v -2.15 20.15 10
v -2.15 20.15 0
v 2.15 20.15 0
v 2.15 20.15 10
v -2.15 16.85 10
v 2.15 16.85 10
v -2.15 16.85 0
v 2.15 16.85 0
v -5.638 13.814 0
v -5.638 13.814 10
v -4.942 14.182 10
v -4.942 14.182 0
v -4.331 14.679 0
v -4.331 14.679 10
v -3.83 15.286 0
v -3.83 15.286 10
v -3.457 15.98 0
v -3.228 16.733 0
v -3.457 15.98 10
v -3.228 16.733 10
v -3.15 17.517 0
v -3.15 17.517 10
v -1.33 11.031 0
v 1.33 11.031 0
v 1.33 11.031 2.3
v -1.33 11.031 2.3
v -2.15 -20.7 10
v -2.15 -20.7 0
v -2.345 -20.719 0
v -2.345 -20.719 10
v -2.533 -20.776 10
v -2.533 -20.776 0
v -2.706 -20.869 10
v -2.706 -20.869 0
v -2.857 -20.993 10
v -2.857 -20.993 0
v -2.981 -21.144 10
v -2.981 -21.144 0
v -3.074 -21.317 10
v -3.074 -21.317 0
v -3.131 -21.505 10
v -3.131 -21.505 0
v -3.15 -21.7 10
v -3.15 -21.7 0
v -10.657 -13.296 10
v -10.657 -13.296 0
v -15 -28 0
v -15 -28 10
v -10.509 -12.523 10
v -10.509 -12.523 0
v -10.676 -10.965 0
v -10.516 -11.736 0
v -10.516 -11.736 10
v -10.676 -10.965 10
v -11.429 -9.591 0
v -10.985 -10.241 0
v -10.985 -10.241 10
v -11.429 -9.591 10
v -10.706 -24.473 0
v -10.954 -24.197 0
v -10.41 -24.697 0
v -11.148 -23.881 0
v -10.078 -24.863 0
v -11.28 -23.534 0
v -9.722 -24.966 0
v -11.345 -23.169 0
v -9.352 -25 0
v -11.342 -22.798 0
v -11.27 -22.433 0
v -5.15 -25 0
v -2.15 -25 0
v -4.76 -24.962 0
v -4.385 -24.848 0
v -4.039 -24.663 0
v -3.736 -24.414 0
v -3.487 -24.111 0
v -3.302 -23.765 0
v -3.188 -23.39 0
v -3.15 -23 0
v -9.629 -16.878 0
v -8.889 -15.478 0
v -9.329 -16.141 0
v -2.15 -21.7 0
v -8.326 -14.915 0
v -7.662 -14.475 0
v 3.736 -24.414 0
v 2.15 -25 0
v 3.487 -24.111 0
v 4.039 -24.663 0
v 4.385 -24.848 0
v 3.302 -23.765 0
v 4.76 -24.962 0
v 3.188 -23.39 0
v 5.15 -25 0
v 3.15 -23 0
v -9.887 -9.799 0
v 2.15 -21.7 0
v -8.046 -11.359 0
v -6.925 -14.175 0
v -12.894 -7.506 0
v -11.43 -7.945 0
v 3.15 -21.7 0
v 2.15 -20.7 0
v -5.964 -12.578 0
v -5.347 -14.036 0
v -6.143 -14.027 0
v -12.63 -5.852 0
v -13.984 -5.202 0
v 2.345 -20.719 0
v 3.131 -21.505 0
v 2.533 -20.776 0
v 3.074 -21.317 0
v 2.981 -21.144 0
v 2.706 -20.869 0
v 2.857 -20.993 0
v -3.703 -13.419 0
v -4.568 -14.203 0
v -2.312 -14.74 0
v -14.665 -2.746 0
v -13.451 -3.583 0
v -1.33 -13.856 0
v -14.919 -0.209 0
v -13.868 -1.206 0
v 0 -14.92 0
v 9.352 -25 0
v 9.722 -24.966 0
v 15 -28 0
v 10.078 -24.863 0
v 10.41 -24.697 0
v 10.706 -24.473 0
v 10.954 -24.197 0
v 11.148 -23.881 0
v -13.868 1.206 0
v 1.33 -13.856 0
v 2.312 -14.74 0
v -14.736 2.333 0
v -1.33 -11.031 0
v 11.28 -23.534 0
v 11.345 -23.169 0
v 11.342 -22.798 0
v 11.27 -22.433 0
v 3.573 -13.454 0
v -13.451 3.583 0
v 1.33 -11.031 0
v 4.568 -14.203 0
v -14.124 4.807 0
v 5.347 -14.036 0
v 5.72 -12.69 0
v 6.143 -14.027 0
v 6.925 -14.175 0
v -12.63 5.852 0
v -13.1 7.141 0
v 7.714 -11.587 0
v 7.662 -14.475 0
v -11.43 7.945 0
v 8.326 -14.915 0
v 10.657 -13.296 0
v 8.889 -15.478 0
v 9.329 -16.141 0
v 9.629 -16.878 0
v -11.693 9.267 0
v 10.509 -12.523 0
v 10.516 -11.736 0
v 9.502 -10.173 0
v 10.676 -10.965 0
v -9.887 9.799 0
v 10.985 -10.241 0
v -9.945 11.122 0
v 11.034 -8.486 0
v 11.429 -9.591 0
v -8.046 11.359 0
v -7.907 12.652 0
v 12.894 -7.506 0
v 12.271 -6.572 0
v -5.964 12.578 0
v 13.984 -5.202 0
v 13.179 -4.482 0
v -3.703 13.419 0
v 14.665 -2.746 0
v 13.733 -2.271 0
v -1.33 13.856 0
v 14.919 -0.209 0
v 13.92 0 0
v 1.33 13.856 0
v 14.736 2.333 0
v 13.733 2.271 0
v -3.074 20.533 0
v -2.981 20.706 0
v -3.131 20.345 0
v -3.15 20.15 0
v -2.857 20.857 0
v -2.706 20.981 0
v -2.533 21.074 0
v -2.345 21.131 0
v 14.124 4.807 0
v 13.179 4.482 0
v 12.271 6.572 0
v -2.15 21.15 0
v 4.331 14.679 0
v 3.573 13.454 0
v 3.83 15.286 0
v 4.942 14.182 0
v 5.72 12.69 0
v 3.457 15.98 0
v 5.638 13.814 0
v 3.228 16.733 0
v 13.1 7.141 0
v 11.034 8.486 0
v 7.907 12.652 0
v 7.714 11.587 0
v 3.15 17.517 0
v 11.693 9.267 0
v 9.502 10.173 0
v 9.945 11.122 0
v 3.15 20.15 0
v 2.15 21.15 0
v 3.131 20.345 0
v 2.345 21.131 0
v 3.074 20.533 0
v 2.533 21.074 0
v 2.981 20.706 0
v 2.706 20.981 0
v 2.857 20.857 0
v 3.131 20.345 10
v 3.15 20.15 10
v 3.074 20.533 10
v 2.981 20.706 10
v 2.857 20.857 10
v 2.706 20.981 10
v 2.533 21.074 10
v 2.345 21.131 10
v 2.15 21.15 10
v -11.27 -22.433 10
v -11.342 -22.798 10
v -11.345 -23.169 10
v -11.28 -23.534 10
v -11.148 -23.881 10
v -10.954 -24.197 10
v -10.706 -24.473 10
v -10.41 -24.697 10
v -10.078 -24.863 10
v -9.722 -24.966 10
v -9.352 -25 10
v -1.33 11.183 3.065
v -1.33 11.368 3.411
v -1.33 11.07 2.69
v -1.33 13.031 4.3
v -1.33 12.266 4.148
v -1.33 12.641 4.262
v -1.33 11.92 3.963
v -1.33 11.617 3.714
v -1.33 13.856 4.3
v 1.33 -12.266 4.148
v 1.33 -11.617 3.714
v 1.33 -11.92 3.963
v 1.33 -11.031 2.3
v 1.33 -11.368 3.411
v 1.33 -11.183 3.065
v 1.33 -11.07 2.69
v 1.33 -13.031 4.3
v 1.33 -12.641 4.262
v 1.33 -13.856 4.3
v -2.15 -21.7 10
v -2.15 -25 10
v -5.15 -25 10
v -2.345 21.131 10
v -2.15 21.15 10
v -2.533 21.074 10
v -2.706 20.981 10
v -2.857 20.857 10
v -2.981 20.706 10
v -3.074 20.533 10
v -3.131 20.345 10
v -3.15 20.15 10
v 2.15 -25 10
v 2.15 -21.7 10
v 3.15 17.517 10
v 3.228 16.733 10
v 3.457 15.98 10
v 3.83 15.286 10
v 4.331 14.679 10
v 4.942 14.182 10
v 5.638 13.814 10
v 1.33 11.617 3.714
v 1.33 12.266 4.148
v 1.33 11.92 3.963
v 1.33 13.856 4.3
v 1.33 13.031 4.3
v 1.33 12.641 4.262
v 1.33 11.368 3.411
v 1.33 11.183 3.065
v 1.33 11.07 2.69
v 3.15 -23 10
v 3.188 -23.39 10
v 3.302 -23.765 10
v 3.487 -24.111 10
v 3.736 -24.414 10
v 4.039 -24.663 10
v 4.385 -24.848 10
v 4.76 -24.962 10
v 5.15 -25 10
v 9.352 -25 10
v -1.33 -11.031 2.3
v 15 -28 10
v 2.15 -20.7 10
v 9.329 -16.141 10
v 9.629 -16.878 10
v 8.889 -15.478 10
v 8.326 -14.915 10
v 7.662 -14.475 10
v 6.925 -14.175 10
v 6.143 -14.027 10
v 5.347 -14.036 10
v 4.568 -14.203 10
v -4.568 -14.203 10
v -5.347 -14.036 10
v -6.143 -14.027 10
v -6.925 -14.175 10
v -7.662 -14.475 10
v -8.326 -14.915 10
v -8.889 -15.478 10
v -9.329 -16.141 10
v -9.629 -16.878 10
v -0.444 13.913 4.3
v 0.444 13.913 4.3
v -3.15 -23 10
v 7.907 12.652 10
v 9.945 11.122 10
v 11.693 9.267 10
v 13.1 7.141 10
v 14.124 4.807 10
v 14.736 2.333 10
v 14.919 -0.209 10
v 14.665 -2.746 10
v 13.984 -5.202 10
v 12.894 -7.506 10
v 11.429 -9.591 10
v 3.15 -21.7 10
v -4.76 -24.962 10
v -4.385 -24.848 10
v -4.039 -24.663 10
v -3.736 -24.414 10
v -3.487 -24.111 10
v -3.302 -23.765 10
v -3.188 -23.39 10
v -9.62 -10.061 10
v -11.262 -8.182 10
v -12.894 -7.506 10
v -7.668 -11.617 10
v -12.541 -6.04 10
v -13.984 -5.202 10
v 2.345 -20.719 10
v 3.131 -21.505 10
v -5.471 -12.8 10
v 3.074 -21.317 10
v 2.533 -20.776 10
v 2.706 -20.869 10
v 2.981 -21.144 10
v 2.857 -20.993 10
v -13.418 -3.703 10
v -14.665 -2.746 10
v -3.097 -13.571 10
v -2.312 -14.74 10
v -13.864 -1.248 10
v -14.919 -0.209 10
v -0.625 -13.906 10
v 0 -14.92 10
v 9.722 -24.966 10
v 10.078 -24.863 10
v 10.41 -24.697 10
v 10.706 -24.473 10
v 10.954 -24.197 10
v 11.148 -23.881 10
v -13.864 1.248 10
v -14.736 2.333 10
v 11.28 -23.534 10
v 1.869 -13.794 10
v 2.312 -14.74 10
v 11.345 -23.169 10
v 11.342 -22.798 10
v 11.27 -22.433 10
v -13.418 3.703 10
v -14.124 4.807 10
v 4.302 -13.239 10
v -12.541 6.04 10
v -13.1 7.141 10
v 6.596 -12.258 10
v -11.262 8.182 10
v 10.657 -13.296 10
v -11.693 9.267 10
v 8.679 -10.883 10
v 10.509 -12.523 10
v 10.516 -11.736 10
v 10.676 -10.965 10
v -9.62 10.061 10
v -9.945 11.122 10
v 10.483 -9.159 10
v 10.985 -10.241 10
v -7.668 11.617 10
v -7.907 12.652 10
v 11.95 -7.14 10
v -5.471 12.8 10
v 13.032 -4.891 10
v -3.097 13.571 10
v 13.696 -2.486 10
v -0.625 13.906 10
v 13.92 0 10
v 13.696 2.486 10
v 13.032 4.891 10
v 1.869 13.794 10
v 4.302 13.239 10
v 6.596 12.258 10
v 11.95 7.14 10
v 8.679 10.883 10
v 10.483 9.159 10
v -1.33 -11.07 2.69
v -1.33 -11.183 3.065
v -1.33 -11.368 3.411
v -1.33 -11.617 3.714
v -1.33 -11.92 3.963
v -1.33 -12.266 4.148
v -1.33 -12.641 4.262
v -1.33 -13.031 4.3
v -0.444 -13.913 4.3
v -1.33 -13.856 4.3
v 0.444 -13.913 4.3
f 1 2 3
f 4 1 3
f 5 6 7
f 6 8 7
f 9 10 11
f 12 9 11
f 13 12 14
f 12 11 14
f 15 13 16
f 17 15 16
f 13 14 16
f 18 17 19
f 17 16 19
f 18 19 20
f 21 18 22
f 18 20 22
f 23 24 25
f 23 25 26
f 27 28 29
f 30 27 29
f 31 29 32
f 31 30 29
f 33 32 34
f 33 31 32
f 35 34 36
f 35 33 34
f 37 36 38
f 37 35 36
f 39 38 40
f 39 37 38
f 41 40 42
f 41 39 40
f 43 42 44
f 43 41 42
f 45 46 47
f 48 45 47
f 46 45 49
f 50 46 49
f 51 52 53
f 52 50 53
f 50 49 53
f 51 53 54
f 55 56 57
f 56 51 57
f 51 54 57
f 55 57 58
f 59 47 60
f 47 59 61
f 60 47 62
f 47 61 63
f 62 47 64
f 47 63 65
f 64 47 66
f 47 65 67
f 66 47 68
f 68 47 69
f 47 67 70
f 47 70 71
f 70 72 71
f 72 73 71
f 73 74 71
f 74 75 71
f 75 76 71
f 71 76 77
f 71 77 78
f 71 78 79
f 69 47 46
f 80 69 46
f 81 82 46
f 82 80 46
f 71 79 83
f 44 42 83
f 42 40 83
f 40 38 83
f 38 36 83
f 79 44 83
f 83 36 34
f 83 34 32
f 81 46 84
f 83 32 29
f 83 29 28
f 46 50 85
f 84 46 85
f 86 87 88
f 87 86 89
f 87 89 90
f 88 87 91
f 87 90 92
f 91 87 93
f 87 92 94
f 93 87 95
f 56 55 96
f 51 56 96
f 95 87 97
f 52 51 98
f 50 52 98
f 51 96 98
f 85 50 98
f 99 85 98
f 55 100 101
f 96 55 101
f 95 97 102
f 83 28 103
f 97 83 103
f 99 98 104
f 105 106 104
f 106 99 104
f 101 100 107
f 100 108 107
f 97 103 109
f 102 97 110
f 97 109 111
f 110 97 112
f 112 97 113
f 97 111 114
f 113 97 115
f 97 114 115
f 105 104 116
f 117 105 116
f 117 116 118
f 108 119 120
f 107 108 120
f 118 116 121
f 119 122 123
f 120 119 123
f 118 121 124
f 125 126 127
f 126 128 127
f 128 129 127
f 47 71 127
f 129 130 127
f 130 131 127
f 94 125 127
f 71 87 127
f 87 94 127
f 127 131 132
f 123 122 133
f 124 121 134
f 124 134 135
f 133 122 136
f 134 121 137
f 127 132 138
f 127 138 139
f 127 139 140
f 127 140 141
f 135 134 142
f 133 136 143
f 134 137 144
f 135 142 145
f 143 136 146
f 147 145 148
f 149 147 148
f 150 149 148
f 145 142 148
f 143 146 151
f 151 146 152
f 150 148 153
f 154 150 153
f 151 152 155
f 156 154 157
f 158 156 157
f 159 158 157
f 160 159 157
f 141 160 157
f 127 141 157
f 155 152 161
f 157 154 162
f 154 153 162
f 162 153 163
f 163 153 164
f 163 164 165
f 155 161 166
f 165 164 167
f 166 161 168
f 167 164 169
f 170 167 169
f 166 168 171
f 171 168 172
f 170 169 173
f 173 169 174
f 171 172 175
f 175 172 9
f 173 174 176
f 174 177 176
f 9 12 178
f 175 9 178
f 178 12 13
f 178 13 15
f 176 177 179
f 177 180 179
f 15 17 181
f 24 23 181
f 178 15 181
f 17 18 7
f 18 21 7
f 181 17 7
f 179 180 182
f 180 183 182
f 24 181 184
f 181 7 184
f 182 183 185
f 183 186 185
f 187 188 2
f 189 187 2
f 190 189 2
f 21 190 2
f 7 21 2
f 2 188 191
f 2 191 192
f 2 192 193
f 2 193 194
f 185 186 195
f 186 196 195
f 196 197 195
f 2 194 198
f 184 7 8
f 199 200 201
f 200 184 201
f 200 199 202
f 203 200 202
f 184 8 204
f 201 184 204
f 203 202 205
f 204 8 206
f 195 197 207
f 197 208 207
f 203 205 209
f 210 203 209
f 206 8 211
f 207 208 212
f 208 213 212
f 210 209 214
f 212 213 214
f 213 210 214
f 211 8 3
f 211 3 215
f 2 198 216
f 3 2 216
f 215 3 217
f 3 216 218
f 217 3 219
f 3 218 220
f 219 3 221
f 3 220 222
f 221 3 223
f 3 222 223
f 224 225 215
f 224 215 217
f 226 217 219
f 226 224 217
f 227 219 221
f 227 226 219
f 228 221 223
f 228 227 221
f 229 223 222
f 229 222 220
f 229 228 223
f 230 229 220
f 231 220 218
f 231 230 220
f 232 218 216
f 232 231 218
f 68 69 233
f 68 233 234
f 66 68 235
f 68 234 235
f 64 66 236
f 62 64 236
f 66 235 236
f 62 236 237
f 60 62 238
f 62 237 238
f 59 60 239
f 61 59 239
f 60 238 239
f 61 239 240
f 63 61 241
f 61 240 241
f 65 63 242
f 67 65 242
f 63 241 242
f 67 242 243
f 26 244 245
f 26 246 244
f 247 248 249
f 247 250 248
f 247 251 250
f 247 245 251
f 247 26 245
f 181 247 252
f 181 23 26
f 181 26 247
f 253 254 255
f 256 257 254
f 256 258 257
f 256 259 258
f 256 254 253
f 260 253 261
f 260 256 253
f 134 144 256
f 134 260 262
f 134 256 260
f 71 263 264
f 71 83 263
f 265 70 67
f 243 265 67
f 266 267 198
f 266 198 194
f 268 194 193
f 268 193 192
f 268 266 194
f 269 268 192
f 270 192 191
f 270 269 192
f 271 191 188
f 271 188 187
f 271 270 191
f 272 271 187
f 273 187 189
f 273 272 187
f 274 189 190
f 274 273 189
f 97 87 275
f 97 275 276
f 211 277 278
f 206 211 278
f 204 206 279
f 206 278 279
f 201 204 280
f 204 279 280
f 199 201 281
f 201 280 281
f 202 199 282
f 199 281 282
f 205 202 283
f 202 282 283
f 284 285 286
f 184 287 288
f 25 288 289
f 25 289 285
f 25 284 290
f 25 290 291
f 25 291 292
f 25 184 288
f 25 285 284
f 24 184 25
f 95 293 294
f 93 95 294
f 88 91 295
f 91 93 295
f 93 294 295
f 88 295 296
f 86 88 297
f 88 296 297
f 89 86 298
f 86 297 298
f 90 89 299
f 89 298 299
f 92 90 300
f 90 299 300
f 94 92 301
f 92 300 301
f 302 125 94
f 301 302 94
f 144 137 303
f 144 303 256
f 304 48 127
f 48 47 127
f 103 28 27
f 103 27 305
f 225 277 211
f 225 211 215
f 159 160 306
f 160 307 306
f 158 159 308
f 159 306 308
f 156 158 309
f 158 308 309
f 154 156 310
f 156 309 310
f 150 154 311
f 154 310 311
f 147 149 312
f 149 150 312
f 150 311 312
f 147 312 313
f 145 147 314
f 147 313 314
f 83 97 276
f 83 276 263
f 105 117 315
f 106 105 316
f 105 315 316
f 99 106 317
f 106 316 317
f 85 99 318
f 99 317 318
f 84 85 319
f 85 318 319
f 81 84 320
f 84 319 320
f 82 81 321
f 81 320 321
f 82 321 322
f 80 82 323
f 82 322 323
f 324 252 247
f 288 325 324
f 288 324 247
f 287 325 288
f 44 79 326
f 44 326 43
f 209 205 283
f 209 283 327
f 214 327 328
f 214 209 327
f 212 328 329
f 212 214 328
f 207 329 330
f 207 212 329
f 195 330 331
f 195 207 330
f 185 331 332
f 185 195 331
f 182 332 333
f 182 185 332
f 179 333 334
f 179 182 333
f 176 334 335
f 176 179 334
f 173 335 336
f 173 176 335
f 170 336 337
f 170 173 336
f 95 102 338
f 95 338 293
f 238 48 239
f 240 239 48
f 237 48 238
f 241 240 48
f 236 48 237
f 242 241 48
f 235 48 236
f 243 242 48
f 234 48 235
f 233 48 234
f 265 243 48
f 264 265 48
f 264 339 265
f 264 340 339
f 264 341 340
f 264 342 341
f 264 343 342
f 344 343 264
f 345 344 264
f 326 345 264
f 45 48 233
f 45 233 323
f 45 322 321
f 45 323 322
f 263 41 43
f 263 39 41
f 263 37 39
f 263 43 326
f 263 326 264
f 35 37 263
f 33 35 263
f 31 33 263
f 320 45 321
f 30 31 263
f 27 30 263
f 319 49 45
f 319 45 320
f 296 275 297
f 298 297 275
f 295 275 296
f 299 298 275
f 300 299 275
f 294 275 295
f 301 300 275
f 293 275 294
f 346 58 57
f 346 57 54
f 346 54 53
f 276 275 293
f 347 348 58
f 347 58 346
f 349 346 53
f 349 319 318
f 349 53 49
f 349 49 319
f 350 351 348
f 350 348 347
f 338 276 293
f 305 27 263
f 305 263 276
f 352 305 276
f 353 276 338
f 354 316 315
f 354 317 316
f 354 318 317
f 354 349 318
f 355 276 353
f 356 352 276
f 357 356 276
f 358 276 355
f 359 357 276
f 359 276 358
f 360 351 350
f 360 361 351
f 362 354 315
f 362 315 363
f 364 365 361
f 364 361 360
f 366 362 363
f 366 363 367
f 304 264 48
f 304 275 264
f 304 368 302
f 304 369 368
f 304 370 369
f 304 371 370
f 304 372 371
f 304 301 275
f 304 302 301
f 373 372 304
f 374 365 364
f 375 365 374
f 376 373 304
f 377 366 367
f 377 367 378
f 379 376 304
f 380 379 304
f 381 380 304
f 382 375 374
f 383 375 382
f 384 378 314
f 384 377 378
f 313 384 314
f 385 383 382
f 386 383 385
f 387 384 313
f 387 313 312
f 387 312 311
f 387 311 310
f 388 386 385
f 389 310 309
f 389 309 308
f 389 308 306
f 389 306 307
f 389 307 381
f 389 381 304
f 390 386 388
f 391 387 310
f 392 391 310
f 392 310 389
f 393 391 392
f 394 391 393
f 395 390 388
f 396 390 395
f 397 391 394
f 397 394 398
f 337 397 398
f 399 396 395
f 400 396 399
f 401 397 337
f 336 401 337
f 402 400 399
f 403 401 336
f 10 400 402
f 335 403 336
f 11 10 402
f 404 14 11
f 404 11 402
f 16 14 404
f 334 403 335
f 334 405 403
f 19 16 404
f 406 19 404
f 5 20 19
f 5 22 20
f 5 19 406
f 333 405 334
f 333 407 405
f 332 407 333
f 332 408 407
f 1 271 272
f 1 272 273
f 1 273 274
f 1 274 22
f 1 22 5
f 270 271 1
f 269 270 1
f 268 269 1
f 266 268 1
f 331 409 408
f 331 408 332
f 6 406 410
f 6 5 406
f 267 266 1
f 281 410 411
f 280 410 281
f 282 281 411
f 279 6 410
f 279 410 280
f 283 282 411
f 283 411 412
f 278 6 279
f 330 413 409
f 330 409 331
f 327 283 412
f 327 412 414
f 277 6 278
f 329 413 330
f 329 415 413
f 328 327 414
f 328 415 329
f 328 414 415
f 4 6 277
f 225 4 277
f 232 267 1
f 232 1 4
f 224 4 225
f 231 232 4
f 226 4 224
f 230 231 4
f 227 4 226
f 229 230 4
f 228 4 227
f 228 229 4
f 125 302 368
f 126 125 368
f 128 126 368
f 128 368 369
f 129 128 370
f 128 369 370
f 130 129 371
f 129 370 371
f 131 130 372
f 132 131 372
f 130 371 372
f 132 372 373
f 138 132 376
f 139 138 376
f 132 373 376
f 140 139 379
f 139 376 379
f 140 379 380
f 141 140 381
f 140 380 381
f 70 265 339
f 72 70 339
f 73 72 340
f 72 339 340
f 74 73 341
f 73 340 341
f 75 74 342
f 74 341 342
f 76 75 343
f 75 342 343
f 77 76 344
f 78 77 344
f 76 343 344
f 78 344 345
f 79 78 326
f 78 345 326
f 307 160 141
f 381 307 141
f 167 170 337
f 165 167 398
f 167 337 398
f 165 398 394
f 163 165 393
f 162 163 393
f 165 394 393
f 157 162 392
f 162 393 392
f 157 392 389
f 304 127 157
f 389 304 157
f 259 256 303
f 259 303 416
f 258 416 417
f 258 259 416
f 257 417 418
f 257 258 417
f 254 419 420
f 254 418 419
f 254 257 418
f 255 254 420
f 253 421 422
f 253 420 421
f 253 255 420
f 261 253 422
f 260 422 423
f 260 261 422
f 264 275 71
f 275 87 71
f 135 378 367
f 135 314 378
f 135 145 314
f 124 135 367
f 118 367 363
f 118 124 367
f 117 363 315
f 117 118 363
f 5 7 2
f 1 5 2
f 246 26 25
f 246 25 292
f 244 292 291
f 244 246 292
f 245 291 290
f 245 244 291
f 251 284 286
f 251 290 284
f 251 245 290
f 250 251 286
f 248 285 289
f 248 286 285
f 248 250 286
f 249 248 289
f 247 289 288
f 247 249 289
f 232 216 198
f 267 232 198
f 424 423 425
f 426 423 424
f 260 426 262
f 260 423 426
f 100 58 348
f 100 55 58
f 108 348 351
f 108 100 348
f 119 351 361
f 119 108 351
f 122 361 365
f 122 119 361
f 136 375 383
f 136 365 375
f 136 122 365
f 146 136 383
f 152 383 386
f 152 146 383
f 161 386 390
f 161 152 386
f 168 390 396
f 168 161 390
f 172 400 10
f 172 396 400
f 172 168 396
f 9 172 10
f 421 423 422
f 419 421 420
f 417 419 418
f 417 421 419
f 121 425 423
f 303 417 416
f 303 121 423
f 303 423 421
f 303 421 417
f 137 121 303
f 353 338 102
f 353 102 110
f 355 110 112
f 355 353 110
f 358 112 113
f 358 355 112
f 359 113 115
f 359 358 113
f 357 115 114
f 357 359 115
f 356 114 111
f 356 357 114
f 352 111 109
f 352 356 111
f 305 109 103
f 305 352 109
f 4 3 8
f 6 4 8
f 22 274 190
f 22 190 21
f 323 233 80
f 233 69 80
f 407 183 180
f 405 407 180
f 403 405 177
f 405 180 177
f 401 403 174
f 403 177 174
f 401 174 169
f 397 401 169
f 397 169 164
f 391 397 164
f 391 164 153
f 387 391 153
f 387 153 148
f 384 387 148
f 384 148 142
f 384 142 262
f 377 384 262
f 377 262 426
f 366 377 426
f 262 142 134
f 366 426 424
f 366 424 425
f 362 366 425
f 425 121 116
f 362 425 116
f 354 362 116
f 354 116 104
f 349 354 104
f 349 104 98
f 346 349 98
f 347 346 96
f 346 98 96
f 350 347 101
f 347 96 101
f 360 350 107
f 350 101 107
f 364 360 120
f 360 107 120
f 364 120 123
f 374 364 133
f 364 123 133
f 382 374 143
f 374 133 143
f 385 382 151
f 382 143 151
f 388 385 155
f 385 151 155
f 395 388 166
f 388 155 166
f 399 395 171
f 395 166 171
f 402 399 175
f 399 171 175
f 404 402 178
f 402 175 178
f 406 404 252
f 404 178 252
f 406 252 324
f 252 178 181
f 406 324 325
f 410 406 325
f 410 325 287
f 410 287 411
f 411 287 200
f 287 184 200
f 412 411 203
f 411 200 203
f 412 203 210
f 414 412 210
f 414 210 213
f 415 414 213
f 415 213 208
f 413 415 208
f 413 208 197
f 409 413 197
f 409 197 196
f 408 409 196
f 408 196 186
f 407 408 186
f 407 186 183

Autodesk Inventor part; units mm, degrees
ref_plane "YZ Plane" through (0, 0, 0) normal (1, 0, 0) x (0, 1, 0)
ref_plane "XZ Plane" through (0, 0, 0) normal (0, 1, 0) x (-1, 0, 0)
ref_plane "XY Plane" through (0, 0, 0) normal (0, 0, 1) x (1, 0, 0)
sketch "Sketch1" plane through (0, 0, 0) normal (0, 0, 1) x (1, 0, 0)
  circle A0 centre (0, 0) radius 13.92
  circle A1 centre (0, 0) radius 14.92
  line L0 (-10, -11.0728) -> (-15, -28)
  line L1 (-15, -28) -> (15, -28)
  line L2 (15, -28) -> (10, -11.0728)
  line L3 (8.3051, -12.3948) -> (12.0284, -25)
  line L4 (12.0284, -25) -> (-12.0284, -25)
  line L5 (-12.0284, -25) -> (-8.3051, -12.3948)
  line L6 (-2, -22) -> (2, -22) construction
  line L7 (2, -22) -> (2, -25) construction
  line L8 (2, -25) -> (-2, -25) construction
  line L9 (-2, -25) -> (-2, -22) construction
  line L10 (2.15, -21.7) -> (-2.15, -21.7)
  line L11 (-2.15, -21.7) -> (-2.15, -25)
  line L12 (-2.15, -25) -> (2.15, -25) construction
  line L13 (2.15, -25) -> (2.15, -25)
  line L14 (2.15, -25) -> (2.15, -21.7)
  line L15 (-2.15, -25) -> (-2.15, -25)
  line L16 (-3.15, -25) -> (-3.15, -20.7)
  line L17 (-3.15, -20.7) -> (3.15, -20.7)
  line L18 (3.15, -20.7) -> (3.15, -25)
  line L19 (-1.48, 13.8411) -> (-1.48, 10.8811) construction
  line L20 (-1.48, 10.8811) -> (1.48, 10.8811) construction
  line L21 (1.48, 10.8811) -> (1.48, 13.8411) construction
  line L22 (1.33, 13.8563) -> (1.33, 11.0311)
  line L23 (1.33, 11.0311) -> (-1.33, 11.0311)
  line L24 (-1.33, 11.0311) -> (-1.33, 13.8563)
  line L25 (-1.33, -13.8563) -> (-1.33, -11.0311)
  line L26 (-1.33, -11.0311) -> (1.33, -11.0311)
  line L27 (1.33, -11.0311) -> (1.33, -13.8563)
  line L28 (2, 20) -> (-2, 20) construction
  line L29 (-2, 20) -> (-2, 17) construction
  line L30 (-2, 17) -> (2, 17) construction
  line L31 (2, 17) -> (2, 20) construction
  line L32 (-2.15, 16.85) -> (-2.15, 20.15)
  line L33 (-2.15, 20.15) -> (2.15, 20.15)
  line L34 (2.15, 20.15) -> (2.15, 16.85)
  line L35 (2.15, 16.85) -> (-2.15, 16.85)
  line L36 (3.15, 14.5837) -> (3.15, 21.15)
  line L37 (3.15, 21.15) -> (-3.15, 21.15)
  line L38 (-3.15, 21.15) -> (-3.15, 14.5837)
  point P0 (0, -22)
  point P1 (0, 10.8811)
  point P2 (0, 20)
  dimension "d0" = 27.84
  dimension "d1" = 1
  dimension "d2" = 3
  dimension "d3" = 2
  dimension "d4" = 2
  dimension "d5" = 28
  dimension "d6" = 30
  dimension "d7" = 20
  dimension "d10" = 3
  dimension "d11" = 4
  dimension "d12" = 3
  dimension "d13" = 0.3
  dimension "d14" = 0.15
  dimension "d15" = 0.15
  dimension "d16" = 1
  dimension "d17" = 1
  dimension "d18" = 1
  dimension "d22" = 2.96
  dimension "d23" = 2.96
  dimension "d24" = 0.15
  dimension "d25" = 0.15
  dimension "d26" = 0.15
  dimension "d30" = 3
  dimension "d31" = 4
  dimension "d32" = 17
  dimension "d33" = 0.15
  dimension "d34" = 1
  dimension "d35" = 1
  dimension "d36" = 1
extrude "Extrusion1" add sketch "Sketch1" along normal blind 10 contours A1 | A1 L38 L37 L36 | L2 L1 L0 A1 L5 L4 L3 | L4 L14 L10 L11 L16 L17 L18
fillet "Fillet1" radius 4 6 edges at (10, -11.0728, 5) (-10, -11.0728, 5) (-8.3051, -12.3948, 5) (8.3051, -12.3948, 5) (3.15, 14.5837, 5) (-3.15, 14.5837, 5)
fillet "Fillet1" radius 2 4 edges at (-12.0284, -25, 5) (12.0284, -25, 5) (3.15, -25, 5) (-3.15, -25, 5)
fillet "Fillet1" radius 1 4 edges at (-3.15, -20.7, 5) (3.15, -20.7, 5) (3.15, 21.15, 5) (-3.15, 21.15, 5)
extrude "Extrusion2" add sketch "Sketch1" along normal blind 4.3 contours L22 L23 L24 A0 | A0 L25 L26 L27
fillet "Fillet2" radius 2 2 edges at (0, -11.0311, 4.3) (0, 11.0311, 4.3)
properties part number "Motor Reversed Mount" material "ABS Plastic"
